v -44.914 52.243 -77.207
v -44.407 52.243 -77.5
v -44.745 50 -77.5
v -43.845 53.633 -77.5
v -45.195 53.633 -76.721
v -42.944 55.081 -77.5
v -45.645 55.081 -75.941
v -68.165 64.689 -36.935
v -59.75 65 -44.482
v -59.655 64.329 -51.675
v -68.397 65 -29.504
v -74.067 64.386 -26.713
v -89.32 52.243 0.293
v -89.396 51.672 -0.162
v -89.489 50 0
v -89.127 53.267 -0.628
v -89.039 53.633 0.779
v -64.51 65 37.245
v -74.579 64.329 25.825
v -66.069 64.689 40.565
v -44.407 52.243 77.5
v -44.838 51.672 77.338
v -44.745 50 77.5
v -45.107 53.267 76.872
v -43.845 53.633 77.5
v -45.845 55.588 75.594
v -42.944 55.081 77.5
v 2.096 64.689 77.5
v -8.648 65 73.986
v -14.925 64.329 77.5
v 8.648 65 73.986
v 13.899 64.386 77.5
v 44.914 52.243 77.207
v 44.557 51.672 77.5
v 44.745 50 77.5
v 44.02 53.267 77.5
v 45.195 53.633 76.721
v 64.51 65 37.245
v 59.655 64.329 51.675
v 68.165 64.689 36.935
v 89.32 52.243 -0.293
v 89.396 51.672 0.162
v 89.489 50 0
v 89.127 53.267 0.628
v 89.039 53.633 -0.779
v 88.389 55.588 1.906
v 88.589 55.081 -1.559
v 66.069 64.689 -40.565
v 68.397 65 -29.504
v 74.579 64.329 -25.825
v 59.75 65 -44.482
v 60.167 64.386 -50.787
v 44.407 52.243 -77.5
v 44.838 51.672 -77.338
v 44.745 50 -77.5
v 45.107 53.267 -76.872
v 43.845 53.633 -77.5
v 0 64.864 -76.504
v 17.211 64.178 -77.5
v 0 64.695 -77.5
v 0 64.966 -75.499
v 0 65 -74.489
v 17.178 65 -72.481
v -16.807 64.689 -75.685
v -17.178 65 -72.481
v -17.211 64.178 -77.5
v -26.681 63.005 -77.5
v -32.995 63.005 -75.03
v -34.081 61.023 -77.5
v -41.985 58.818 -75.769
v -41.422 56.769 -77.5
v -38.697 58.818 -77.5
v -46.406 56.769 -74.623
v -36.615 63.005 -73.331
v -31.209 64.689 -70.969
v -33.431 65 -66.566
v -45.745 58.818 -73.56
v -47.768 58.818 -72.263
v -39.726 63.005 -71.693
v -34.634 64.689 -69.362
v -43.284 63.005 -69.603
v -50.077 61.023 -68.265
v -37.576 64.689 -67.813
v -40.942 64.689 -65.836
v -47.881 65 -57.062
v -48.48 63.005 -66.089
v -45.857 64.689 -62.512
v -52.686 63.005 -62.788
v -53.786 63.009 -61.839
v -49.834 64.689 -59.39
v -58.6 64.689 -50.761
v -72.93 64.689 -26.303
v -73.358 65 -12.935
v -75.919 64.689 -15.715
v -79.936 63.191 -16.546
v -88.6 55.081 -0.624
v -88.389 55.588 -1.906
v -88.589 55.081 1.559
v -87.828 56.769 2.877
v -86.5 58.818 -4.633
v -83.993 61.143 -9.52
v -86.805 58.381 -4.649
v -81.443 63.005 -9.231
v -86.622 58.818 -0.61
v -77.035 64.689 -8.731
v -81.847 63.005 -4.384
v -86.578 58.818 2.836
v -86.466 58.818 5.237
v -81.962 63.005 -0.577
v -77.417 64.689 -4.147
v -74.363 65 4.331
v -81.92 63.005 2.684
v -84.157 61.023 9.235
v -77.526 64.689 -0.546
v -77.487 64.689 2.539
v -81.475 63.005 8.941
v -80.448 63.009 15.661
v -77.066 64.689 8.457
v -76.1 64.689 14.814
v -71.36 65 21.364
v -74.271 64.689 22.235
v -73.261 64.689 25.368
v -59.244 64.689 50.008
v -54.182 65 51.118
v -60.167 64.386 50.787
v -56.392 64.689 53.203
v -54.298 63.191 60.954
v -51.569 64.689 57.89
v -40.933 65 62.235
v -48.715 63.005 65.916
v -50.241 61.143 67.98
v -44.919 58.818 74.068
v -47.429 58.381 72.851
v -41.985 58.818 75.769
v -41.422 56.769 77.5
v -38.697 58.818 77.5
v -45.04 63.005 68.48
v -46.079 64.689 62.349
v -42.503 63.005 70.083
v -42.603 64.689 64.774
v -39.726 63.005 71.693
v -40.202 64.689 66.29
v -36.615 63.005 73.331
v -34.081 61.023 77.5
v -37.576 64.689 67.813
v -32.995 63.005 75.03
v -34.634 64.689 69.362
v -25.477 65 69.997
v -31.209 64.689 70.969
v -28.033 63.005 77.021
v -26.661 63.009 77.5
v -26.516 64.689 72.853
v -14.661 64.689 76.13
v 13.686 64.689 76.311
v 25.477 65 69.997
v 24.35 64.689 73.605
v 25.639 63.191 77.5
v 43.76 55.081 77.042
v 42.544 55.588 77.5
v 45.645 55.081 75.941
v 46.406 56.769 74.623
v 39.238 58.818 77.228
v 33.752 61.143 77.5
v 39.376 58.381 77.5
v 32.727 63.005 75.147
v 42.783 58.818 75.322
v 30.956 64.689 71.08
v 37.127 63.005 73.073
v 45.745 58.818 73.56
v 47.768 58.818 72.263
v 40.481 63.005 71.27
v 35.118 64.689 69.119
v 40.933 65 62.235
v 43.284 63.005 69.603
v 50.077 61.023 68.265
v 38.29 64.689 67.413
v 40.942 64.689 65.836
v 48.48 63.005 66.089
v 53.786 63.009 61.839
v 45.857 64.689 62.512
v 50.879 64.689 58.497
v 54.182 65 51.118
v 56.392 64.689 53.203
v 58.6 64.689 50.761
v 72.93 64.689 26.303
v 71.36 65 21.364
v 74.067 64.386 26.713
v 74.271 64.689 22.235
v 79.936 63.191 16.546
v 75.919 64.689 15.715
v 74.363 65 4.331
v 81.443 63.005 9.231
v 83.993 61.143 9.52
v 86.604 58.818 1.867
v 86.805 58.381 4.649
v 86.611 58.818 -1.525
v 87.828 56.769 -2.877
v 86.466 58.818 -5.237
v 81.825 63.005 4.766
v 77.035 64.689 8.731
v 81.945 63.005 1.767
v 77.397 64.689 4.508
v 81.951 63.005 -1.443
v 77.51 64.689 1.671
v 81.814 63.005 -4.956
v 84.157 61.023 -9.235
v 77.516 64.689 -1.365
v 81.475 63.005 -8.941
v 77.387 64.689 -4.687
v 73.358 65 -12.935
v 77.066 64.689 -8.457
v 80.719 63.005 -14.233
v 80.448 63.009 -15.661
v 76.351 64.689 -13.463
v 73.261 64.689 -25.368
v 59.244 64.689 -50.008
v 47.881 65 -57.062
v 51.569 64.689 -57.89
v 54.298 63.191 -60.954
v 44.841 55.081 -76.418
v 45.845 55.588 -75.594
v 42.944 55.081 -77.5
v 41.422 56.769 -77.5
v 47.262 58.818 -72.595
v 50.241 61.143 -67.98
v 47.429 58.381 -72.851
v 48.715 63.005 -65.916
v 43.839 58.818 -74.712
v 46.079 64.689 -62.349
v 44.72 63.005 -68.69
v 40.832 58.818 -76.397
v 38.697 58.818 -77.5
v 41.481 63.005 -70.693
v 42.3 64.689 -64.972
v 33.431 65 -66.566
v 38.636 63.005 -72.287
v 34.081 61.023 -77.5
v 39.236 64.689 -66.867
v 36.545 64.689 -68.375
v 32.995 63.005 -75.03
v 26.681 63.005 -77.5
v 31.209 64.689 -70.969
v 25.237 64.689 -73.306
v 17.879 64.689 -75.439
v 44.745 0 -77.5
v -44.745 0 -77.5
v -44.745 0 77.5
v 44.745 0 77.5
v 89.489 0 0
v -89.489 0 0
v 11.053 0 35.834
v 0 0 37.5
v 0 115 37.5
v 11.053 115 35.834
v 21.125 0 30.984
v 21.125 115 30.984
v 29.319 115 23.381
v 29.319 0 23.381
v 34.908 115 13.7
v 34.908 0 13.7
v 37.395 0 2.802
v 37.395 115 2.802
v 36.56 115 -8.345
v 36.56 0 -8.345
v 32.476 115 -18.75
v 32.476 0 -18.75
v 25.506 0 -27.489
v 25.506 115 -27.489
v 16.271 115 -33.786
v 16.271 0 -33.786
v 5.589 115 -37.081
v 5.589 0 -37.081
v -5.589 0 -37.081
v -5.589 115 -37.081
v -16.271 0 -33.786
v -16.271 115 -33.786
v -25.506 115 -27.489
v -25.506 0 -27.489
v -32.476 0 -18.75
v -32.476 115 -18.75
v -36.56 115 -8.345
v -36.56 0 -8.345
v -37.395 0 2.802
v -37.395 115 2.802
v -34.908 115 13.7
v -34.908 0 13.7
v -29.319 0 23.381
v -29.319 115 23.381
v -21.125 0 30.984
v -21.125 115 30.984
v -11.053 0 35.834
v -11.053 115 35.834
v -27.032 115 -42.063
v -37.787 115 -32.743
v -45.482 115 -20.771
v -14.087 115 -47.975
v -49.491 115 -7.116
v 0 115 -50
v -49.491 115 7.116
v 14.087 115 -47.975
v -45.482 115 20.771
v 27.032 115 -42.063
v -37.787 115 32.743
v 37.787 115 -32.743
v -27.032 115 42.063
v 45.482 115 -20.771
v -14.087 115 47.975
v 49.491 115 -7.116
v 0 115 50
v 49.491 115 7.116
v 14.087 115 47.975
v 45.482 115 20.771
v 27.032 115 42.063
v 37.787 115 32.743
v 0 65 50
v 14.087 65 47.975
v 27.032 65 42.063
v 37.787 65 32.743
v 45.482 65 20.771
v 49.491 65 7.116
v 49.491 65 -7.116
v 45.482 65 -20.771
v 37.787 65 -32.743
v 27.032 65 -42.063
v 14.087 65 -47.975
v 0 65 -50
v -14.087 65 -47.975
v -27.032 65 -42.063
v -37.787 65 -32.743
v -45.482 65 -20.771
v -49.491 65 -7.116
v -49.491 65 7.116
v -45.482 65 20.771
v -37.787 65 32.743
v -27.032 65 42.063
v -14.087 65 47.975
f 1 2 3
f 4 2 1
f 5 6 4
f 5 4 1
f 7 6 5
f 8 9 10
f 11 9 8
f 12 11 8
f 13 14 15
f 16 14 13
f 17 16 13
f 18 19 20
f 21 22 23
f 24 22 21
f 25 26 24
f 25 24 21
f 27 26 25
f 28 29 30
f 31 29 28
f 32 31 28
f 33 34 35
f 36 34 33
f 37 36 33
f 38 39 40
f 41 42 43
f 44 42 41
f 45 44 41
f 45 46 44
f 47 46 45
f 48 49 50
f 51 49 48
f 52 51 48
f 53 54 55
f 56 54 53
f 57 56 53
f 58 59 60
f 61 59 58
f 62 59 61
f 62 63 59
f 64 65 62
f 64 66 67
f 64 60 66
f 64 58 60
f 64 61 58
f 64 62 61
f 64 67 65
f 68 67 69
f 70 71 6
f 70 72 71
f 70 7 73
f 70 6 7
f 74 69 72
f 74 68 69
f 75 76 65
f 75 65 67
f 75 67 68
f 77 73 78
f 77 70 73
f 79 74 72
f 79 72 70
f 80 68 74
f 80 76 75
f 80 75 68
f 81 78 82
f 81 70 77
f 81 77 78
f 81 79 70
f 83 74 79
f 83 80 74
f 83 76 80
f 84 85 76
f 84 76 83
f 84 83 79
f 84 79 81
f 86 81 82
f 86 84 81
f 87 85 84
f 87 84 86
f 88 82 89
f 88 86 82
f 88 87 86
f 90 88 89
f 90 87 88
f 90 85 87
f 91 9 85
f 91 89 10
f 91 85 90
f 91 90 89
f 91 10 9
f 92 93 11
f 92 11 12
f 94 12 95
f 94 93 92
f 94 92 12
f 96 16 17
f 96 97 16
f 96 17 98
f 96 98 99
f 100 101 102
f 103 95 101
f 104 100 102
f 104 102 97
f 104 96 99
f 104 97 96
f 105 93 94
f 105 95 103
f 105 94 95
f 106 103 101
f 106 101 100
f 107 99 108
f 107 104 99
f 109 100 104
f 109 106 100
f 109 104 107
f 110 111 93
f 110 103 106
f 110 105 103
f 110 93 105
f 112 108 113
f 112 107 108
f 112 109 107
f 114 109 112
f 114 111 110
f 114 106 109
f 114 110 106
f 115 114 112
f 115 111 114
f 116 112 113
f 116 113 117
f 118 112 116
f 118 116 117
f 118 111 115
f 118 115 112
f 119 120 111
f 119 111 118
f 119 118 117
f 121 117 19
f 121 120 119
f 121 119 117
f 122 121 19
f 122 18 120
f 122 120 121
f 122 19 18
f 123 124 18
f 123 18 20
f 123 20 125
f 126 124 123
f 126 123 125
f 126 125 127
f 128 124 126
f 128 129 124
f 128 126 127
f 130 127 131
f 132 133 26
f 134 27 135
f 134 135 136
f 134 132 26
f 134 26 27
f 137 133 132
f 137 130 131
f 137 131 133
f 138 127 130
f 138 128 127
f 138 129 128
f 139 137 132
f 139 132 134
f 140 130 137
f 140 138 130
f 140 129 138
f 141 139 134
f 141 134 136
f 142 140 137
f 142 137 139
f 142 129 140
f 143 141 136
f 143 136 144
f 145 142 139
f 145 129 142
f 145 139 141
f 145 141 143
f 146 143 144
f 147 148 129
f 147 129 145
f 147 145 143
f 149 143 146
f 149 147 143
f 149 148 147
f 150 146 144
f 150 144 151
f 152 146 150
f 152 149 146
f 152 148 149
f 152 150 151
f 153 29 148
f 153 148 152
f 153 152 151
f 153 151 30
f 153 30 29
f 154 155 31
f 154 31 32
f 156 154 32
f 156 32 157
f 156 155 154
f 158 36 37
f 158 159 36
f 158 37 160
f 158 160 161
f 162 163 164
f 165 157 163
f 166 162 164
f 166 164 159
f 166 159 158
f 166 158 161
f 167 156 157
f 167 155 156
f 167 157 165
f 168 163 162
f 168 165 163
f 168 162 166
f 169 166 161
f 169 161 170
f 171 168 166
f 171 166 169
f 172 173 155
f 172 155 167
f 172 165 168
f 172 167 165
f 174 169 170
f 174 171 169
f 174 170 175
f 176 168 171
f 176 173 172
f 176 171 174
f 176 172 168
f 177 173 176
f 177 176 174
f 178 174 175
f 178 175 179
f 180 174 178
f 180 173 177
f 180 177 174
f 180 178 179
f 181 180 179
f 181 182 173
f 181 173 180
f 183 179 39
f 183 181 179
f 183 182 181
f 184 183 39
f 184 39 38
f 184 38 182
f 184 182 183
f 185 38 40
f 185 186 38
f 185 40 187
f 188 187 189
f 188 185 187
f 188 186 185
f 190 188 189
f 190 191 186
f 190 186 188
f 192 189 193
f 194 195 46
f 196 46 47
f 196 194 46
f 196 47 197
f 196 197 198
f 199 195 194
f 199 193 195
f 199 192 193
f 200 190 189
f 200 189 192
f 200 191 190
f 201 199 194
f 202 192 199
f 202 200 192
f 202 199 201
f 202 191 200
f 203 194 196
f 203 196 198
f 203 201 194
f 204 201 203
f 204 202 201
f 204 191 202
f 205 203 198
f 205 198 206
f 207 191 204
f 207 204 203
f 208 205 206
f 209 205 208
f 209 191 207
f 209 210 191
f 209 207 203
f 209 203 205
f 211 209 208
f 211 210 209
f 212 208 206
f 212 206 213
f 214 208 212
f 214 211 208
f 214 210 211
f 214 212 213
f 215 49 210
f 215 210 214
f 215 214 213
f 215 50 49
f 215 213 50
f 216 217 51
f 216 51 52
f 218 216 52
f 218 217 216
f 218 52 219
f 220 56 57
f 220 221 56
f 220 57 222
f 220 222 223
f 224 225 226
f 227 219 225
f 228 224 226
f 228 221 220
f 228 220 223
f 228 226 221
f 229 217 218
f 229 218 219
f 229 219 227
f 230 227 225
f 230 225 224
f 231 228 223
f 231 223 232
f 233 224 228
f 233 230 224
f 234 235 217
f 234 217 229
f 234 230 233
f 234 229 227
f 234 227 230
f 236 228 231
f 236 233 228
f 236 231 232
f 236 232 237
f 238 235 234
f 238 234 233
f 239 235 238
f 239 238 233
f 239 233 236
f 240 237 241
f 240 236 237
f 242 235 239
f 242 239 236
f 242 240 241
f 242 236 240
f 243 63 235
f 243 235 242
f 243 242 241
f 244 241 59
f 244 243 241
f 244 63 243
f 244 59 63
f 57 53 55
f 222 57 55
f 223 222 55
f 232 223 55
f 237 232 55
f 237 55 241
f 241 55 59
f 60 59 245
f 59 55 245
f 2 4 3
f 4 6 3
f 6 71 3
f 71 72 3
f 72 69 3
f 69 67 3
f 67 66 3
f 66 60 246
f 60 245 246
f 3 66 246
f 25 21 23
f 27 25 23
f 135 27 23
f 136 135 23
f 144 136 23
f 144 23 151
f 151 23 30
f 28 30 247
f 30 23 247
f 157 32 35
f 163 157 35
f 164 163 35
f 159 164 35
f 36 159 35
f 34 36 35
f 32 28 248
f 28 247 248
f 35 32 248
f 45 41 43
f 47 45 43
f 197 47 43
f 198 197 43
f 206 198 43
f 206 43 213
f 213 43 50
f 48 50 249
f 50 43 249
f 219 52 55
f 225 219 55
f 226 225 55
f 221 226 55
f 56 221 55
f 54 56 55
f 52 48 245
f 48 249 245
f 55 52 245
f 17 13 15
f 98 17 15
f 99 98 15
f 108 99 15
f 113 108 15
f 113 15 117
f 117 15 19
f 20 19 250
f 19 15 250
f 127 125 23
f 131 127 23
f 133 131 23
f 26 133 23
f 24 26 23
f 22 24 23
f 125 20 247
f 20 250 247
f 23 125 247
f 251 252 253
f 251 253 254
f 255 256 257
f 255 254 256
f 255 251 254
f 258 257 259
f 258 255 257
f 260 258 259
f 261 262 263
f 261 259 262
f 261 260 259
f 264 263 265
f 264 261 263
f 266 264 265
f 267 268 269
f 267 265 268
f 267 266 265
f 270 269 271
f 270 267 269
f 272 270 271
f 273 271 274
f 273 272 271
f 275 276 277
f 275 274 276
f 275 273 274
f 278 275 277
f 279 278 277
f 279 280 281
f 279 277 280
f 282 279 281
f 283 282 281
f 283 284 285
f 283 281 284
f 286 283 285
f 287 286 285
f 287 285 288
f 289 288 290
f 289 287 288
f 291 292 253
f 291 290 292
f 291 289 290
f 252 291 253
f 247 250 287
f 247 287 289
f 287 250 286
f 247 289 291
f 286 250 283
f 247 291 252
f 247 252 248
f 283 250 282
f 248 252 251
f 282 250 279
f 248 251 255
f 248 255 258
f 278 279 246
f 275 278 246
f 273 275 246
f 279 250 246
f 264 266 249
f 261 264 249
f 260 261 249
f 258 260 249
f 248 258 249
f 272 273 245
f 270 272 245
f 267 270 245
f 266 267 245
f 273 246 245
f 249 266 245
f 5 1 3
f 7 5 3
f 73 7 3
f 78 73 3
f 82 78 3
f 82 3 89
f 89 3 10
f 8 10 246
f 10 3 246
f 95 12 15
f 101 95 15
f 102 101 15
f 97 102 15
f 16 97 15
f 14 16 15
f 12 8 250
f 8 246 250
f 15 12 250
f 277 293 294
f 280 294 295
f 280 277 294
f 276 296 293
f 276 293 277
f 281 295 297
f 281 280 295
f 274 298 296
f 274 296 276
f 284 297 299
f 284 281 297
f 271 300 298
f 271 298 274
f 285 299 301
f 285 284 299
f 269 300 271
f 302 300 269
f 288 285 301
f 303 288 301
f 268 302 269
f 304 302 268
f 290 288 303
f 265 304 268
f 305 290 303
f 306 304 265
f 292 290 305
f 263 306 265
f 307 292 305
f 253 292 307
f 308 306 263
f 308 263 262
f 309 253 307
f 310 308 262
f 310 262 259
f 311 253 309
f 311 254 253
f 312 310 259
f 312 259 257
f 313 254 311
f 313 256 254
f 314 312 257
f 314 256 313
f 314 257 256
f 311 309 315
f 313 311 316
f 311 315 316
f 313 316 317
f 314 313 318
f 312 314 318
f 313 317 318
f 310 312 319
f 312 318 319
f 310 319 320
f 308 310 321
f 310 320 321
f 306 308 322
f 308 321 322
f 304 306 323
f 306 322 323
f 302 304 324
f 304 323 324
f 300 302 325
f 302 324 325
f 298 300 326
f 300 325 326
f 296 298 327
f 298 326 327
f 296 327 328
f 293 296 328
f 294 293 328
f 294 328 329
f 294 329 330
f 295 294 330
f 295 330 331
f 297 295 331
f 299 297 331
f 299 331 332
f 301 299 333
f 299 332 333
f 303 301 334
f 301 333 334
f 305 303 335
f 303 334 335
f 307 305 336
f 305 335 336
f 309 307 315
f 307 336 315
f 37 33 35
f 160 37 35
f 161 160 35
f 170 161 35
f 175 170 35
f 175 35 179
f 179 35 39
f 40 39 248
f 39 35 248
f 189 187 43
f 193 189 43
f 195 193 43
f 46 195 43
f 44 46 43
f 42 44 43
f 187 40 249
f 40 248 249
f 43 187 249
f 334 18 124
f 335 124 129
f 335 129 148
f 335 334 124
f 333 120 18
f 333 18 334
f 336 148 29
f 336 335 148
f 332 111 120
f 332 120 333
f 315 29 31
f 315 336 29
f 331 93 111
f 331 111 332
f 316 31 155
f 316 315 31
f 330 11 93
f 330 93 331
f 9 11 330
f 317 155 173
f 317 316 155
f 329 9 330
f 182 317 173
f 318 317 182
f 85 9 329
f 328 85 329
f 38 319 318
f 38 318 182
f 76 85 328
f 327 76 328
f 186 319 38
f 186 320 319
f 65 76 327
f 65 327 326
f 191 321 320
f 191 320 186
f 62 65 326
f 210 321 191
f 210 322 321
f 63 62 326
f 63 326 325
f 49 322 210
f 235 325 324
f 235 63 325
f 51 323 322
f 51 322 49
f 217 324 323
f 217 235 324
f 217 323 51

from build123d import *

# Parameters (mm, degrees)
BOSS_EXTRUDE1_DEPTH     = 65
SKETCH4_R               = 50
BOSS_EXTRUDE2_DEPTH     = 50
CUT_EXTRUDE1_DEPTH      = 166.044186174
CUT_EXTRUDE1_DEPTH_BACK = 166.044186174
SKETCH5_R               = 37.5


with BuildPart() as part:
    # Sketch1 → Boss-Extrude1 (new body)
    with BuildSketch(Plane(origin=(0, 0, 0), x_dir=(1, 0, 0), z_dir=(0, 1, 0))):
        Polygon((-44.744645862, -77.5), (44.744645862, -77.5), (89.489291724, 0), (-89.489291724, 0), align=None)
        Polygon((-89.489291724, 0), (89.489291724, 0), (44.744645862, 77.5), (-44.744645862, 77.5), align=None)
    extrude(amount=BOSS_EXTRUDE1_DEPTH)

    # Sketch2 → Cut-Revolve1 (revolve, cut)
    with BuildSketch(Plane.XY, mode=Mode.PRIVATE) as cut_revolve1_sk:
        with BuildLine():
            Line((74.489291724, 65), (74.489291724, 71.033853329))
            Line((74.489291724, 71.033853329), (95.90922918, 71.033853329))
            Line((95.90922918, 71.033853329), (95.90922918, 50))
            Line((95.90922918, 50), (89.489291724, 50))
            ThreePointArc((89.489291724, 50), (85.095893442, 60.606601718), (74.489291724, 65))
        make_face()
    revolve(cut_revolve1_sk.sketch.rotate(Axis((0, 0, 0), (0, 1, 0)), 90), axis=Axis((0, 0, 0), (0, 1, 0)), mode=Mode.SUBTRACT)

    # Sketch4 → Boss-Extrude2 (add)
    with BuildSketch(Plane(origin=(0, 65, 0), x_dir=(1, 0, 0), z_dir=(0, 1, 0))):
        with Locations(Location((0, 0, 0), (0, 0, 270))):
            Circle(SKETCH4_R)
    extrude(amount=BOSS_EXTRUDE2_DEPTH)

    # Sketch5 → Cut-Extrude1 (cut, two sides: drawn at the far end of the back side and taken through both)
    with BuildSketch(Plane(origin=(0, 115, 0), x_dir=(1, 0, 0), z_dir=(0, 1, 0)).offset(-CUT_EXTRUDE1_DEPTH_BACK)):
        with Locations(Location((0, 0, 0), (0, 0, 270))):
            Circle(SKETCH5_R)
    extrude(amount=CUT_EXTRUDE1_DEPTH + CUT_EXTRUDE1_DEPTH_BACK, mode=Mode.SUBTRACT)


solid = part.part
